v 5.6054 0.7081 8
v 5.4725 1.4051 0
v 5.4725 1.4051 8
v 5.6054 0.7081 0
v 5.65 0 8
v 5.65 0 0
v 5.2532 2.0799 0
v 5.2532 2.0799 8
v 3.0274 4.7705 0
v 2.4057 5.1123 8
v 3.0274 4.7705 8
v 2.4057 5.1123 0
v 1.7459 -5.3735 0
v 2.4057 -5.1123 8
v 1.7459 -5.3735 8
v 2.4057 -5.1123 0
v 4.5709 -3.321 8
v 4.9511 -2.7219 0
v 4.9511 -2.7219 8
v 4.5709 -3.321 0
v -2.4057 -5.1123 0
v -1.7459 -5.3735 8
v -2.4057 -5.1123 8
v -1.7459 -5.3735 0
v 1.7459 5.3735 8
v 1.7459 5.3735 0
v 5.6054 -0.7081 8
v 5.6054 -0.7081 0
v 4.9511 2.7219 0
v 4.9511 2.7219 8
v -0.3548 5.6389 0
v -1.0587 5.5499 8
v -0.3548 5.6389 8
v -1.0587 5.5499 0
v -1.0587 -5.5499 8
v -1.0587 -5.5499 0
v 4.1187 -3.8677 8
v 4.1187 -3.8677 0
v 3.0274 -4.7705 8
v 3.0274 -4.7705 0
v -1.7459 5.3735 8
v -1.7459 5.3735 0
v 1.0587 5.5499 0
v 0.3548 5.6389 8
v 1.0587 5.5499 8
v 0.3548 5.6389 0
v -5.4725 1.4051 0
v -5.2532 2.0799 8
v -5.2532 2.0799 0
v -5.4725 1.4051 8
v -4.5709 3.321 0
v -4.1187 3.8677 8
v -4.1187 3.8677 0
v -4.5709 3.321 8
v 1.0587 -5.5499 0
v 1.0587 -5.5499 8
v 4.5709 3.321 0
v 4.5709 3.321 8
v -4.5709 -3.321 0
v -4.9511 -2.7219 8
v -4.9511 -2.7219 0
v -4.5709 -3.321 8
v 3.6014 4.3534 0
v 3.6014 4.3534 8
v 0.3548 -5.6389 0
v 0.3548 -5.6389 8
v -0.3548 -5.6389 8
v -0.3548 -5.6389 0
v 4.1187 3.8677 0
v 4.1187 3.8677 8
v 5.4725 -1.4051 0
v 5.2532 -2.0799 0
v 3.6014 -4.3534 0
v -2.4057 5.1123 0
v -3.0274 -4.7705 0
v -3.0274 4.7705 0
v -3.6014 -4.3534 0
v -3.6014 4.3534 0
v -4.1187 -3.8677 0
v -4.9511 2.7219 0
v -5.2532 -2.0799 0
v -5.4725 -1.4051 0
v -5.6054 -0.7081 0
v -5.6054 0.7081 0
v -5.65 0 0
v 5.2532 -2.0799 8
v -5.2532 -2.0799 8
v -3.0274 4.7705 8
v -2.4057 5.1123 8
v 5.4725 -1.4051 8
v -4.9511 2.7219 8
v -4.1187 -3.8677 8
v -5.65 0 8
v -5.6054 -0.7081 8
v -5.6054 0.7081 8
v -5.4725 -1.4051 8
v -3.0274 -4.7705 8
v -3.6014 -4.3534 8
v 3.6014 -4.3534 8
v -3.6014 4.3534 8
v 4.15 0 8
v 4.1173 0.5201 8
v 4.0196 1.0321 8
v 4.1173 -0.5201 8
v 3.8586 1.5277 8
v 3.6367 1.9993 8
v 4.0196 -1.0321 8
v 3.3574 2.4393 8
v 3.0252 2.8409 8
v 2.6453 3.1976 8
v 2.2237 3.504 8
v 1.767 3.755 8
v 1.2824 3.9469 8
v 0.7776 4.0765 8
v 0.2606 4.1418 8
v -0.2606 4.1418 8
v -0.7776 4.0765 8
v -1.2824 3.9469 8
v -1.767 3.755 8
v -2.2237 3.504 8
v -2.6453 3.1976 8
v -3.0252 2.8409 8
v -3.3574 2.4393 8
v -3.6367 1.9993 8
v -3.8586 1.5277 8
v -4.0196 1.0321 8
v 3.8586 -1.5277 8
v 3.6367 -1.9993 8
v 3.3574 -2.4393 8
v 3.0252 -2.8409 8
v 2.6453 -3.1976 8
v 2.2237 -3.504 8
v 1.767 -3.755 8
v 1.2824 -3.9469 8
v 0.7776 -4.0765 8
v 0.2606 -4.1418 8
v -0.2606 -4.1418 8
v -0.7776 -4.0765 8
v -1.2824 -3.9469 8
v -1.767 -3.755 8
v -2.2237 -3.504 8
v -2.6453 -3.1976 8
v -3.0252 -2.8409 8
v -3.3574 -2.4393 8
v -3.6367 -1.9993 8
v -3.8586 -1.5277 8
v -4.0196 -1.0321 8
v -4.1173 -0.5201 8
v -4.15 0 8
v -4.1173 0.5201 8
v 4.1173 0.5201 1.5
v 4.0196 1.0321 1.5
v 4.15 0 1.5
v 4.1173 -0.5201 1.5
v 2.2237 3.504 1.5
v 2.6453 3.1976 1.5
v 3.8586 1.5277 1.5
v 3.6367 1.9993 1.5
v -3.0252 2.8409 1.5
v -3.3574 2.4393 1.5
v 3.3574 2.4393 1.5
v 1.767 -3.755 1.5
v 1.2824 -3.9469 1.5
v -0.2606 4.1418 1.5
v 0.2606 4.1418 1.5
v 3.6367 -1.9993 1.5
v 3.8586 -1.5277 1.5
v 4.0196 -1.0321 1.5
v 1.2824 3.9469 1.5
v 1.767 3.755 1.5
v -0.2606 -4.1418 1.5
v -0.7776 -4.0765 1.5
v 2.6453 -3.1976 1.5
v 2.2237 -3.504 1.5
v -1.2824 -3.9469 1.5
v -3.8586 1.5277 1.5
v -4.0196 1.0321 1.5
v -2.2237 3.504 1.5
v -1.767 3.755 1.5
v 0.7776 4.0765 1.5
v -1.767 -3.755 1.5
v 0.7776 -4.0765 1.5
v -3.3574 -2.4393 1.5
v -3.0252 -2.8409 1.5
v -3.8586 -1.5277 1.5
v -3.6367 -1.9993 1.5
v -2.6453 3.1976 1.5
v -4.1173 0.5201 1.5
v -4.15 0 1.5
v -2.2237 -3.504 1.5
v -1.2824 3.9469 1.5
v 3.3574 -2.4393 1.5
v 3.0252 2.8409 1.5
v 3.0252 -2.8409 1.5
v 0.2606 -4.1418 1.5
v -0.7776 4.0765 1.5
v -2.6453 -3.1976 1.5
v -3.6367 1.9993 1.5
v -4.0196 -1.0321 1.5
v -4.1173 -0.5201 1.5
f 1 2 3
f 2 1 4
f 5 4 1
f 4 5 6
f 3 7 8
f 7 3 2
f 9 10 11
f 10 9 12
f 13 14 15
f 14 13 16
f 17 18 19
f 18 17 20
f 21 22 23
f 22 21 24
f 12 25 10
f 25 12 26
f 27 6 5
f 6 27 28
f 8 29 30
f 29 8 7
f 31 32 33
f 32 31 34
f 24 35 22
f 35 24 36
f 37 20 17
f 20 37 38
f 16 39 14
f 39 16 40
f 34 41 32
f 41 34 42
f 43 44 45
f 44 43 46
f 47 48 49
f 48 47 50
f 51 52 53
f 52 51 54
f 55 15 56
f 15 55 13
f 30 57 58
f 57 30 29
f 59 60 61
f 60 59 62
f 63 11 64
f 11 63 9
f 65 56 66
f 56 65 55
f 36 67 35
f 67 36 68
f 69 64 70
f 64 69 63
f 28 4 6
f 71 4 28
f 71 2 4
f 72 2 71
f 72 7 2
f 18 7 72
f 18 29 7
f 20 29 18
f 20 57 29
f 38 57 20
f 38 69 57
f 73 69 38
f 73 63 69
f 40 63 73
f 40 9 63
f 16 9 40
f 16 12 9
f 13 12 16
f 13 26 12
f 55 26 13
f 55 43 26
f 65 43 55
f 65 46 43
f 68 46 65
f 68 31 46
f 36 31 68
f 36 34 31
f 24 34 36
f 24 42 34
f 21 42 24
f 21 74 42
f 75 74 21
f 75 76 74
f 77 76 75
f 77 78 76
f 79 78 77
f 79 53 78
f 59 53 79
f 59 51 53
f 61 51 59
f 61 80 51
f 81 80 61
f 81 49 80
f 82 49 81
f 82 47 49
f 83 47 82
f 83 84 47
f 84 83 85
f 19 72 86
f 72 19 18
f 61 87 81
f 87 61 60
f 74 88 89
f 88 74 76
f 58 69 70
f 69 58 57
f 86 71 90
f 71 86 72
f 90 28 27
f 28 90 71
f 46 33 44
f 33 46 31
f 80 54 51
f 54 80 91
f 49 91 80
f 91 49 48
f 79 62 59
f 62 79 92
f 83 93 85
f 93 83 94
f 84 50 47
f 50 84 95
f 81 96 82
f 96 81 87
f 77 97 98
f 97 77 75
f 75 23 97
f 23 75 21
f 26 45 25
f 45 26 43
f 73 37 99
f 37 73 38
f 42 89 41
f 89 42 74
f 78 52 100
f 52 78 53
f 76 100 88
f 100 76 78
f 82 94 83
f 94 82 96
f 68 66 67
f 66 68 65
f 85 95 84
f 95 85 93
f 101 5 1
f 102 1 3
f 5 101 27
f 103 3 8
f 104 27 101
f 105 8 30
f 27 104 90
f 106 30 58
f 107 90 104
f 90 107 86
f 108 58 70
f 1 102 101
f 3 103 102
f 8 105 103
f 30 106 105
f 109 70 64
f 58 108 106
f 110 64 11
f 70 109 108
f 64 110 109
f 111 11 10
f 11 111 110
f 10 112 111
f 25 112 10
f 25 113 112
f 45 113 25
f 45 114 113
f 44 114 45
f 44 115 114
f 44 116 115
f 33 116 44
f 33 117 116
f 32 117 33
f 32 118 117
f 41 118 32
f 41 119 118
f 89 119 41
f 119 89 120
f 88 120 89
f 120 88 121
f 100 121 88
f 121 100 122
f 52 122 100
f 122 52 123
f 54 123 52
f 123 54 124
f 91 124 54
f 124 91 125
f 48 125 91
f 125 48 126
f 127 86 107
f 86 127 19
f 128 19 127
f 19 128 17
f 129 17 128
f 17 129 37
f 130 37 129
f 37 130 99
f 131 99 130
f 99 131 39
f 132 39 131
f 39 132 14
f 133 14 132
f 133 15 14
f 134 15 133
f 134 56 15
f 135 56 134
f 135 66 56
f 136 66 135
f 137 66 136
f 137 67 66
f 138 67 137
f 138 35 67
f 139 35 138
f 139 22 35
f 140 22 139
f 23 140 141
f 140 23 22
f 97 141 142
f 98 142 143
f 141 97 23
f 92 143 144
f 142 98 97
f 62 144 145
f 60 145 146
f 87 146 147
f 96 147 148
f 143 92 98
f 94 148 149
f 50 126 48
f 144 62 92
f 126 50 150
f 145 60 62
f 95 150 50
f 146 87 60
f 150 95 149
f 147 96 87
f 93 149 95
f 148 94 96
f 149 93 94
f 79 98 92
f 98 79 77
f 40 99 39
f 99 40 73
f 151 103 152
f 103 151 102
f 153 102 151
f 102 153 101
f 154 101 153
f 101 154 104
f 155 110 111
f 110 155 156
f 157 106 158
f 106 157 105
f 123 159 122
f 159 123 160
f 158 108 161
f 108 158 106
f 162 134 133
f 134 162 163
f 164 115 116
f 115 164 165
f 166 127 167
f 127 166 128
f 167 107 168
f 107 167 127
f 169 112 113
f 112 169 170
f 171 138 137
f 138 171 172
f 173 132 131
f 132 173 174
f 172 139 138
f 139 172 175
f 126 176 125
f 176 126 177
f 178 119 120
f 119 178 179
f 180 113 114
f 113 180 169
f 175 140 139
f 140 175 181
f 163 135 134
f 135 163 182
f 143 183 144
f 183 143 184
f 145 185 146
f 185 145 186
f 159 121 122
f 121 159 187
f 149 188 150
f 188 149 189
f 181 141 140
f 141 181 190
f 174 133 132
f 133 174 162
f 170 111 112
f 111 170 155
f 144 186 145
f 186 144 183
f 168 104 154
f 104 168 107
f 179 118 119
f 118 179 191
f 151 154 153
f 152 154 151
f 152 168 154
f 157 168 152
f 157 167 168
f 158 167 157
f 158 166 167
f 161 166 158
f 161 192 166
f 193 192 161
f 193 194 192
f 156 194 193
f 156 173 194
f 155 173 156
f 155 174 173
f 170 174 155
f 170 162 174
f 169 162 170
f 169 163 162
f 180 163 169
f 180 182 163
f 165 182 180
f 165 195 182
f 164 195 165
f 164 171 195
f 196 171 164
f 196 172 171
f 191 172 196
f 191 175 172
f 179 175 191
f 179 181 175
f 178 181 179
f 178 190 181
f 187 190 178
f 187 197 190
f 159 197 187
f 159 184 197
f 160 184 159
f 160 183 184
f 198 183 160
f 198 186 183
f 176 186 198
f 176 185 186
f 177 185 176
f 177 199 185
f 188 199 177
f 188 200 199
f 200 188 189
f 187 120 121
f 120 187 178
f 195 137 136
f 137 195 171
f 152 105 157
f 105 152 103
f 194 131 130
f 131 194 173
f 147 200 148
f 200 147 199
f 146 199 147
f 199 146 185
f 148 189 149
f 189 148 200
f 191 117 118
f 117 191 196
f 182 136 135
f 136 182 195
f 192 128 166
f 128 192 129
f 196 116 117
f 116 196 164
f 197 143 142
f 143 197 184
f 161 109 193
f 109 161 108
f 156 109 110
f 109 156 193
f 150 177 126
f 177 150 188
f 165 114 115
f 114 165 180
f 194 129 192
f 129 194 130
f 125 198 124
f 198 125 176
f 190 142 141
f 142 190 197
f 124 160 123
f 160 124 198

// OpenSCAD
/* ********************
//
// End Cap for Axle - Endkappe für Rundholz
// CC-BY-SA October 2017 by ohuf@Thingiverse
//
// www.thingiverse.com/thing:2573435

(English text below...)

Für meinen Spulenhalter (für Elekronikdrähte) 
benutzte ich einen Buche-Rundstab aus dem Baumarkt als Achse.
Um die Achse vor dem Herausfallen zu sichern, habe ich diese Endkappen gedruckt und aufgeschoben.

-----

These are simple end caps for wood axles.
I made them in order to secure the axle of my spool holder.

Enjoy, have fun remixing and let me know when you've made one, and what for!

// Version 2 - 2017-09-07
//
// 
// License: CC-BY-SA
// read all about it here: http://creativecommons.org/licenses/by-sa/4.0/
// ********************** */

/* [cap size] */
// Length of the cap || Länge der Kappe
height = 8;	 

// The inner diameter of the cap corresponds to the outer diameter of your axle || Der innere Durchmesser der Kappe entspricht dem Durchmesser deines Rundholzes
innerDia = 8.3; 

// The thickness of the cap's wall || Die Wandstärke der Kappe
wall = 1.5; 

/* [Hidden] */
$fn=50;
outerDia = innerDia + 2*wall;
ix=0.005;	// This is just some static value to beautify the cutout

difference(){
cylinder(d=outerDia, h=height);
	translate([0, 0, wall])
cylinder(d=innerDia,h=height-wall+ix);
}
